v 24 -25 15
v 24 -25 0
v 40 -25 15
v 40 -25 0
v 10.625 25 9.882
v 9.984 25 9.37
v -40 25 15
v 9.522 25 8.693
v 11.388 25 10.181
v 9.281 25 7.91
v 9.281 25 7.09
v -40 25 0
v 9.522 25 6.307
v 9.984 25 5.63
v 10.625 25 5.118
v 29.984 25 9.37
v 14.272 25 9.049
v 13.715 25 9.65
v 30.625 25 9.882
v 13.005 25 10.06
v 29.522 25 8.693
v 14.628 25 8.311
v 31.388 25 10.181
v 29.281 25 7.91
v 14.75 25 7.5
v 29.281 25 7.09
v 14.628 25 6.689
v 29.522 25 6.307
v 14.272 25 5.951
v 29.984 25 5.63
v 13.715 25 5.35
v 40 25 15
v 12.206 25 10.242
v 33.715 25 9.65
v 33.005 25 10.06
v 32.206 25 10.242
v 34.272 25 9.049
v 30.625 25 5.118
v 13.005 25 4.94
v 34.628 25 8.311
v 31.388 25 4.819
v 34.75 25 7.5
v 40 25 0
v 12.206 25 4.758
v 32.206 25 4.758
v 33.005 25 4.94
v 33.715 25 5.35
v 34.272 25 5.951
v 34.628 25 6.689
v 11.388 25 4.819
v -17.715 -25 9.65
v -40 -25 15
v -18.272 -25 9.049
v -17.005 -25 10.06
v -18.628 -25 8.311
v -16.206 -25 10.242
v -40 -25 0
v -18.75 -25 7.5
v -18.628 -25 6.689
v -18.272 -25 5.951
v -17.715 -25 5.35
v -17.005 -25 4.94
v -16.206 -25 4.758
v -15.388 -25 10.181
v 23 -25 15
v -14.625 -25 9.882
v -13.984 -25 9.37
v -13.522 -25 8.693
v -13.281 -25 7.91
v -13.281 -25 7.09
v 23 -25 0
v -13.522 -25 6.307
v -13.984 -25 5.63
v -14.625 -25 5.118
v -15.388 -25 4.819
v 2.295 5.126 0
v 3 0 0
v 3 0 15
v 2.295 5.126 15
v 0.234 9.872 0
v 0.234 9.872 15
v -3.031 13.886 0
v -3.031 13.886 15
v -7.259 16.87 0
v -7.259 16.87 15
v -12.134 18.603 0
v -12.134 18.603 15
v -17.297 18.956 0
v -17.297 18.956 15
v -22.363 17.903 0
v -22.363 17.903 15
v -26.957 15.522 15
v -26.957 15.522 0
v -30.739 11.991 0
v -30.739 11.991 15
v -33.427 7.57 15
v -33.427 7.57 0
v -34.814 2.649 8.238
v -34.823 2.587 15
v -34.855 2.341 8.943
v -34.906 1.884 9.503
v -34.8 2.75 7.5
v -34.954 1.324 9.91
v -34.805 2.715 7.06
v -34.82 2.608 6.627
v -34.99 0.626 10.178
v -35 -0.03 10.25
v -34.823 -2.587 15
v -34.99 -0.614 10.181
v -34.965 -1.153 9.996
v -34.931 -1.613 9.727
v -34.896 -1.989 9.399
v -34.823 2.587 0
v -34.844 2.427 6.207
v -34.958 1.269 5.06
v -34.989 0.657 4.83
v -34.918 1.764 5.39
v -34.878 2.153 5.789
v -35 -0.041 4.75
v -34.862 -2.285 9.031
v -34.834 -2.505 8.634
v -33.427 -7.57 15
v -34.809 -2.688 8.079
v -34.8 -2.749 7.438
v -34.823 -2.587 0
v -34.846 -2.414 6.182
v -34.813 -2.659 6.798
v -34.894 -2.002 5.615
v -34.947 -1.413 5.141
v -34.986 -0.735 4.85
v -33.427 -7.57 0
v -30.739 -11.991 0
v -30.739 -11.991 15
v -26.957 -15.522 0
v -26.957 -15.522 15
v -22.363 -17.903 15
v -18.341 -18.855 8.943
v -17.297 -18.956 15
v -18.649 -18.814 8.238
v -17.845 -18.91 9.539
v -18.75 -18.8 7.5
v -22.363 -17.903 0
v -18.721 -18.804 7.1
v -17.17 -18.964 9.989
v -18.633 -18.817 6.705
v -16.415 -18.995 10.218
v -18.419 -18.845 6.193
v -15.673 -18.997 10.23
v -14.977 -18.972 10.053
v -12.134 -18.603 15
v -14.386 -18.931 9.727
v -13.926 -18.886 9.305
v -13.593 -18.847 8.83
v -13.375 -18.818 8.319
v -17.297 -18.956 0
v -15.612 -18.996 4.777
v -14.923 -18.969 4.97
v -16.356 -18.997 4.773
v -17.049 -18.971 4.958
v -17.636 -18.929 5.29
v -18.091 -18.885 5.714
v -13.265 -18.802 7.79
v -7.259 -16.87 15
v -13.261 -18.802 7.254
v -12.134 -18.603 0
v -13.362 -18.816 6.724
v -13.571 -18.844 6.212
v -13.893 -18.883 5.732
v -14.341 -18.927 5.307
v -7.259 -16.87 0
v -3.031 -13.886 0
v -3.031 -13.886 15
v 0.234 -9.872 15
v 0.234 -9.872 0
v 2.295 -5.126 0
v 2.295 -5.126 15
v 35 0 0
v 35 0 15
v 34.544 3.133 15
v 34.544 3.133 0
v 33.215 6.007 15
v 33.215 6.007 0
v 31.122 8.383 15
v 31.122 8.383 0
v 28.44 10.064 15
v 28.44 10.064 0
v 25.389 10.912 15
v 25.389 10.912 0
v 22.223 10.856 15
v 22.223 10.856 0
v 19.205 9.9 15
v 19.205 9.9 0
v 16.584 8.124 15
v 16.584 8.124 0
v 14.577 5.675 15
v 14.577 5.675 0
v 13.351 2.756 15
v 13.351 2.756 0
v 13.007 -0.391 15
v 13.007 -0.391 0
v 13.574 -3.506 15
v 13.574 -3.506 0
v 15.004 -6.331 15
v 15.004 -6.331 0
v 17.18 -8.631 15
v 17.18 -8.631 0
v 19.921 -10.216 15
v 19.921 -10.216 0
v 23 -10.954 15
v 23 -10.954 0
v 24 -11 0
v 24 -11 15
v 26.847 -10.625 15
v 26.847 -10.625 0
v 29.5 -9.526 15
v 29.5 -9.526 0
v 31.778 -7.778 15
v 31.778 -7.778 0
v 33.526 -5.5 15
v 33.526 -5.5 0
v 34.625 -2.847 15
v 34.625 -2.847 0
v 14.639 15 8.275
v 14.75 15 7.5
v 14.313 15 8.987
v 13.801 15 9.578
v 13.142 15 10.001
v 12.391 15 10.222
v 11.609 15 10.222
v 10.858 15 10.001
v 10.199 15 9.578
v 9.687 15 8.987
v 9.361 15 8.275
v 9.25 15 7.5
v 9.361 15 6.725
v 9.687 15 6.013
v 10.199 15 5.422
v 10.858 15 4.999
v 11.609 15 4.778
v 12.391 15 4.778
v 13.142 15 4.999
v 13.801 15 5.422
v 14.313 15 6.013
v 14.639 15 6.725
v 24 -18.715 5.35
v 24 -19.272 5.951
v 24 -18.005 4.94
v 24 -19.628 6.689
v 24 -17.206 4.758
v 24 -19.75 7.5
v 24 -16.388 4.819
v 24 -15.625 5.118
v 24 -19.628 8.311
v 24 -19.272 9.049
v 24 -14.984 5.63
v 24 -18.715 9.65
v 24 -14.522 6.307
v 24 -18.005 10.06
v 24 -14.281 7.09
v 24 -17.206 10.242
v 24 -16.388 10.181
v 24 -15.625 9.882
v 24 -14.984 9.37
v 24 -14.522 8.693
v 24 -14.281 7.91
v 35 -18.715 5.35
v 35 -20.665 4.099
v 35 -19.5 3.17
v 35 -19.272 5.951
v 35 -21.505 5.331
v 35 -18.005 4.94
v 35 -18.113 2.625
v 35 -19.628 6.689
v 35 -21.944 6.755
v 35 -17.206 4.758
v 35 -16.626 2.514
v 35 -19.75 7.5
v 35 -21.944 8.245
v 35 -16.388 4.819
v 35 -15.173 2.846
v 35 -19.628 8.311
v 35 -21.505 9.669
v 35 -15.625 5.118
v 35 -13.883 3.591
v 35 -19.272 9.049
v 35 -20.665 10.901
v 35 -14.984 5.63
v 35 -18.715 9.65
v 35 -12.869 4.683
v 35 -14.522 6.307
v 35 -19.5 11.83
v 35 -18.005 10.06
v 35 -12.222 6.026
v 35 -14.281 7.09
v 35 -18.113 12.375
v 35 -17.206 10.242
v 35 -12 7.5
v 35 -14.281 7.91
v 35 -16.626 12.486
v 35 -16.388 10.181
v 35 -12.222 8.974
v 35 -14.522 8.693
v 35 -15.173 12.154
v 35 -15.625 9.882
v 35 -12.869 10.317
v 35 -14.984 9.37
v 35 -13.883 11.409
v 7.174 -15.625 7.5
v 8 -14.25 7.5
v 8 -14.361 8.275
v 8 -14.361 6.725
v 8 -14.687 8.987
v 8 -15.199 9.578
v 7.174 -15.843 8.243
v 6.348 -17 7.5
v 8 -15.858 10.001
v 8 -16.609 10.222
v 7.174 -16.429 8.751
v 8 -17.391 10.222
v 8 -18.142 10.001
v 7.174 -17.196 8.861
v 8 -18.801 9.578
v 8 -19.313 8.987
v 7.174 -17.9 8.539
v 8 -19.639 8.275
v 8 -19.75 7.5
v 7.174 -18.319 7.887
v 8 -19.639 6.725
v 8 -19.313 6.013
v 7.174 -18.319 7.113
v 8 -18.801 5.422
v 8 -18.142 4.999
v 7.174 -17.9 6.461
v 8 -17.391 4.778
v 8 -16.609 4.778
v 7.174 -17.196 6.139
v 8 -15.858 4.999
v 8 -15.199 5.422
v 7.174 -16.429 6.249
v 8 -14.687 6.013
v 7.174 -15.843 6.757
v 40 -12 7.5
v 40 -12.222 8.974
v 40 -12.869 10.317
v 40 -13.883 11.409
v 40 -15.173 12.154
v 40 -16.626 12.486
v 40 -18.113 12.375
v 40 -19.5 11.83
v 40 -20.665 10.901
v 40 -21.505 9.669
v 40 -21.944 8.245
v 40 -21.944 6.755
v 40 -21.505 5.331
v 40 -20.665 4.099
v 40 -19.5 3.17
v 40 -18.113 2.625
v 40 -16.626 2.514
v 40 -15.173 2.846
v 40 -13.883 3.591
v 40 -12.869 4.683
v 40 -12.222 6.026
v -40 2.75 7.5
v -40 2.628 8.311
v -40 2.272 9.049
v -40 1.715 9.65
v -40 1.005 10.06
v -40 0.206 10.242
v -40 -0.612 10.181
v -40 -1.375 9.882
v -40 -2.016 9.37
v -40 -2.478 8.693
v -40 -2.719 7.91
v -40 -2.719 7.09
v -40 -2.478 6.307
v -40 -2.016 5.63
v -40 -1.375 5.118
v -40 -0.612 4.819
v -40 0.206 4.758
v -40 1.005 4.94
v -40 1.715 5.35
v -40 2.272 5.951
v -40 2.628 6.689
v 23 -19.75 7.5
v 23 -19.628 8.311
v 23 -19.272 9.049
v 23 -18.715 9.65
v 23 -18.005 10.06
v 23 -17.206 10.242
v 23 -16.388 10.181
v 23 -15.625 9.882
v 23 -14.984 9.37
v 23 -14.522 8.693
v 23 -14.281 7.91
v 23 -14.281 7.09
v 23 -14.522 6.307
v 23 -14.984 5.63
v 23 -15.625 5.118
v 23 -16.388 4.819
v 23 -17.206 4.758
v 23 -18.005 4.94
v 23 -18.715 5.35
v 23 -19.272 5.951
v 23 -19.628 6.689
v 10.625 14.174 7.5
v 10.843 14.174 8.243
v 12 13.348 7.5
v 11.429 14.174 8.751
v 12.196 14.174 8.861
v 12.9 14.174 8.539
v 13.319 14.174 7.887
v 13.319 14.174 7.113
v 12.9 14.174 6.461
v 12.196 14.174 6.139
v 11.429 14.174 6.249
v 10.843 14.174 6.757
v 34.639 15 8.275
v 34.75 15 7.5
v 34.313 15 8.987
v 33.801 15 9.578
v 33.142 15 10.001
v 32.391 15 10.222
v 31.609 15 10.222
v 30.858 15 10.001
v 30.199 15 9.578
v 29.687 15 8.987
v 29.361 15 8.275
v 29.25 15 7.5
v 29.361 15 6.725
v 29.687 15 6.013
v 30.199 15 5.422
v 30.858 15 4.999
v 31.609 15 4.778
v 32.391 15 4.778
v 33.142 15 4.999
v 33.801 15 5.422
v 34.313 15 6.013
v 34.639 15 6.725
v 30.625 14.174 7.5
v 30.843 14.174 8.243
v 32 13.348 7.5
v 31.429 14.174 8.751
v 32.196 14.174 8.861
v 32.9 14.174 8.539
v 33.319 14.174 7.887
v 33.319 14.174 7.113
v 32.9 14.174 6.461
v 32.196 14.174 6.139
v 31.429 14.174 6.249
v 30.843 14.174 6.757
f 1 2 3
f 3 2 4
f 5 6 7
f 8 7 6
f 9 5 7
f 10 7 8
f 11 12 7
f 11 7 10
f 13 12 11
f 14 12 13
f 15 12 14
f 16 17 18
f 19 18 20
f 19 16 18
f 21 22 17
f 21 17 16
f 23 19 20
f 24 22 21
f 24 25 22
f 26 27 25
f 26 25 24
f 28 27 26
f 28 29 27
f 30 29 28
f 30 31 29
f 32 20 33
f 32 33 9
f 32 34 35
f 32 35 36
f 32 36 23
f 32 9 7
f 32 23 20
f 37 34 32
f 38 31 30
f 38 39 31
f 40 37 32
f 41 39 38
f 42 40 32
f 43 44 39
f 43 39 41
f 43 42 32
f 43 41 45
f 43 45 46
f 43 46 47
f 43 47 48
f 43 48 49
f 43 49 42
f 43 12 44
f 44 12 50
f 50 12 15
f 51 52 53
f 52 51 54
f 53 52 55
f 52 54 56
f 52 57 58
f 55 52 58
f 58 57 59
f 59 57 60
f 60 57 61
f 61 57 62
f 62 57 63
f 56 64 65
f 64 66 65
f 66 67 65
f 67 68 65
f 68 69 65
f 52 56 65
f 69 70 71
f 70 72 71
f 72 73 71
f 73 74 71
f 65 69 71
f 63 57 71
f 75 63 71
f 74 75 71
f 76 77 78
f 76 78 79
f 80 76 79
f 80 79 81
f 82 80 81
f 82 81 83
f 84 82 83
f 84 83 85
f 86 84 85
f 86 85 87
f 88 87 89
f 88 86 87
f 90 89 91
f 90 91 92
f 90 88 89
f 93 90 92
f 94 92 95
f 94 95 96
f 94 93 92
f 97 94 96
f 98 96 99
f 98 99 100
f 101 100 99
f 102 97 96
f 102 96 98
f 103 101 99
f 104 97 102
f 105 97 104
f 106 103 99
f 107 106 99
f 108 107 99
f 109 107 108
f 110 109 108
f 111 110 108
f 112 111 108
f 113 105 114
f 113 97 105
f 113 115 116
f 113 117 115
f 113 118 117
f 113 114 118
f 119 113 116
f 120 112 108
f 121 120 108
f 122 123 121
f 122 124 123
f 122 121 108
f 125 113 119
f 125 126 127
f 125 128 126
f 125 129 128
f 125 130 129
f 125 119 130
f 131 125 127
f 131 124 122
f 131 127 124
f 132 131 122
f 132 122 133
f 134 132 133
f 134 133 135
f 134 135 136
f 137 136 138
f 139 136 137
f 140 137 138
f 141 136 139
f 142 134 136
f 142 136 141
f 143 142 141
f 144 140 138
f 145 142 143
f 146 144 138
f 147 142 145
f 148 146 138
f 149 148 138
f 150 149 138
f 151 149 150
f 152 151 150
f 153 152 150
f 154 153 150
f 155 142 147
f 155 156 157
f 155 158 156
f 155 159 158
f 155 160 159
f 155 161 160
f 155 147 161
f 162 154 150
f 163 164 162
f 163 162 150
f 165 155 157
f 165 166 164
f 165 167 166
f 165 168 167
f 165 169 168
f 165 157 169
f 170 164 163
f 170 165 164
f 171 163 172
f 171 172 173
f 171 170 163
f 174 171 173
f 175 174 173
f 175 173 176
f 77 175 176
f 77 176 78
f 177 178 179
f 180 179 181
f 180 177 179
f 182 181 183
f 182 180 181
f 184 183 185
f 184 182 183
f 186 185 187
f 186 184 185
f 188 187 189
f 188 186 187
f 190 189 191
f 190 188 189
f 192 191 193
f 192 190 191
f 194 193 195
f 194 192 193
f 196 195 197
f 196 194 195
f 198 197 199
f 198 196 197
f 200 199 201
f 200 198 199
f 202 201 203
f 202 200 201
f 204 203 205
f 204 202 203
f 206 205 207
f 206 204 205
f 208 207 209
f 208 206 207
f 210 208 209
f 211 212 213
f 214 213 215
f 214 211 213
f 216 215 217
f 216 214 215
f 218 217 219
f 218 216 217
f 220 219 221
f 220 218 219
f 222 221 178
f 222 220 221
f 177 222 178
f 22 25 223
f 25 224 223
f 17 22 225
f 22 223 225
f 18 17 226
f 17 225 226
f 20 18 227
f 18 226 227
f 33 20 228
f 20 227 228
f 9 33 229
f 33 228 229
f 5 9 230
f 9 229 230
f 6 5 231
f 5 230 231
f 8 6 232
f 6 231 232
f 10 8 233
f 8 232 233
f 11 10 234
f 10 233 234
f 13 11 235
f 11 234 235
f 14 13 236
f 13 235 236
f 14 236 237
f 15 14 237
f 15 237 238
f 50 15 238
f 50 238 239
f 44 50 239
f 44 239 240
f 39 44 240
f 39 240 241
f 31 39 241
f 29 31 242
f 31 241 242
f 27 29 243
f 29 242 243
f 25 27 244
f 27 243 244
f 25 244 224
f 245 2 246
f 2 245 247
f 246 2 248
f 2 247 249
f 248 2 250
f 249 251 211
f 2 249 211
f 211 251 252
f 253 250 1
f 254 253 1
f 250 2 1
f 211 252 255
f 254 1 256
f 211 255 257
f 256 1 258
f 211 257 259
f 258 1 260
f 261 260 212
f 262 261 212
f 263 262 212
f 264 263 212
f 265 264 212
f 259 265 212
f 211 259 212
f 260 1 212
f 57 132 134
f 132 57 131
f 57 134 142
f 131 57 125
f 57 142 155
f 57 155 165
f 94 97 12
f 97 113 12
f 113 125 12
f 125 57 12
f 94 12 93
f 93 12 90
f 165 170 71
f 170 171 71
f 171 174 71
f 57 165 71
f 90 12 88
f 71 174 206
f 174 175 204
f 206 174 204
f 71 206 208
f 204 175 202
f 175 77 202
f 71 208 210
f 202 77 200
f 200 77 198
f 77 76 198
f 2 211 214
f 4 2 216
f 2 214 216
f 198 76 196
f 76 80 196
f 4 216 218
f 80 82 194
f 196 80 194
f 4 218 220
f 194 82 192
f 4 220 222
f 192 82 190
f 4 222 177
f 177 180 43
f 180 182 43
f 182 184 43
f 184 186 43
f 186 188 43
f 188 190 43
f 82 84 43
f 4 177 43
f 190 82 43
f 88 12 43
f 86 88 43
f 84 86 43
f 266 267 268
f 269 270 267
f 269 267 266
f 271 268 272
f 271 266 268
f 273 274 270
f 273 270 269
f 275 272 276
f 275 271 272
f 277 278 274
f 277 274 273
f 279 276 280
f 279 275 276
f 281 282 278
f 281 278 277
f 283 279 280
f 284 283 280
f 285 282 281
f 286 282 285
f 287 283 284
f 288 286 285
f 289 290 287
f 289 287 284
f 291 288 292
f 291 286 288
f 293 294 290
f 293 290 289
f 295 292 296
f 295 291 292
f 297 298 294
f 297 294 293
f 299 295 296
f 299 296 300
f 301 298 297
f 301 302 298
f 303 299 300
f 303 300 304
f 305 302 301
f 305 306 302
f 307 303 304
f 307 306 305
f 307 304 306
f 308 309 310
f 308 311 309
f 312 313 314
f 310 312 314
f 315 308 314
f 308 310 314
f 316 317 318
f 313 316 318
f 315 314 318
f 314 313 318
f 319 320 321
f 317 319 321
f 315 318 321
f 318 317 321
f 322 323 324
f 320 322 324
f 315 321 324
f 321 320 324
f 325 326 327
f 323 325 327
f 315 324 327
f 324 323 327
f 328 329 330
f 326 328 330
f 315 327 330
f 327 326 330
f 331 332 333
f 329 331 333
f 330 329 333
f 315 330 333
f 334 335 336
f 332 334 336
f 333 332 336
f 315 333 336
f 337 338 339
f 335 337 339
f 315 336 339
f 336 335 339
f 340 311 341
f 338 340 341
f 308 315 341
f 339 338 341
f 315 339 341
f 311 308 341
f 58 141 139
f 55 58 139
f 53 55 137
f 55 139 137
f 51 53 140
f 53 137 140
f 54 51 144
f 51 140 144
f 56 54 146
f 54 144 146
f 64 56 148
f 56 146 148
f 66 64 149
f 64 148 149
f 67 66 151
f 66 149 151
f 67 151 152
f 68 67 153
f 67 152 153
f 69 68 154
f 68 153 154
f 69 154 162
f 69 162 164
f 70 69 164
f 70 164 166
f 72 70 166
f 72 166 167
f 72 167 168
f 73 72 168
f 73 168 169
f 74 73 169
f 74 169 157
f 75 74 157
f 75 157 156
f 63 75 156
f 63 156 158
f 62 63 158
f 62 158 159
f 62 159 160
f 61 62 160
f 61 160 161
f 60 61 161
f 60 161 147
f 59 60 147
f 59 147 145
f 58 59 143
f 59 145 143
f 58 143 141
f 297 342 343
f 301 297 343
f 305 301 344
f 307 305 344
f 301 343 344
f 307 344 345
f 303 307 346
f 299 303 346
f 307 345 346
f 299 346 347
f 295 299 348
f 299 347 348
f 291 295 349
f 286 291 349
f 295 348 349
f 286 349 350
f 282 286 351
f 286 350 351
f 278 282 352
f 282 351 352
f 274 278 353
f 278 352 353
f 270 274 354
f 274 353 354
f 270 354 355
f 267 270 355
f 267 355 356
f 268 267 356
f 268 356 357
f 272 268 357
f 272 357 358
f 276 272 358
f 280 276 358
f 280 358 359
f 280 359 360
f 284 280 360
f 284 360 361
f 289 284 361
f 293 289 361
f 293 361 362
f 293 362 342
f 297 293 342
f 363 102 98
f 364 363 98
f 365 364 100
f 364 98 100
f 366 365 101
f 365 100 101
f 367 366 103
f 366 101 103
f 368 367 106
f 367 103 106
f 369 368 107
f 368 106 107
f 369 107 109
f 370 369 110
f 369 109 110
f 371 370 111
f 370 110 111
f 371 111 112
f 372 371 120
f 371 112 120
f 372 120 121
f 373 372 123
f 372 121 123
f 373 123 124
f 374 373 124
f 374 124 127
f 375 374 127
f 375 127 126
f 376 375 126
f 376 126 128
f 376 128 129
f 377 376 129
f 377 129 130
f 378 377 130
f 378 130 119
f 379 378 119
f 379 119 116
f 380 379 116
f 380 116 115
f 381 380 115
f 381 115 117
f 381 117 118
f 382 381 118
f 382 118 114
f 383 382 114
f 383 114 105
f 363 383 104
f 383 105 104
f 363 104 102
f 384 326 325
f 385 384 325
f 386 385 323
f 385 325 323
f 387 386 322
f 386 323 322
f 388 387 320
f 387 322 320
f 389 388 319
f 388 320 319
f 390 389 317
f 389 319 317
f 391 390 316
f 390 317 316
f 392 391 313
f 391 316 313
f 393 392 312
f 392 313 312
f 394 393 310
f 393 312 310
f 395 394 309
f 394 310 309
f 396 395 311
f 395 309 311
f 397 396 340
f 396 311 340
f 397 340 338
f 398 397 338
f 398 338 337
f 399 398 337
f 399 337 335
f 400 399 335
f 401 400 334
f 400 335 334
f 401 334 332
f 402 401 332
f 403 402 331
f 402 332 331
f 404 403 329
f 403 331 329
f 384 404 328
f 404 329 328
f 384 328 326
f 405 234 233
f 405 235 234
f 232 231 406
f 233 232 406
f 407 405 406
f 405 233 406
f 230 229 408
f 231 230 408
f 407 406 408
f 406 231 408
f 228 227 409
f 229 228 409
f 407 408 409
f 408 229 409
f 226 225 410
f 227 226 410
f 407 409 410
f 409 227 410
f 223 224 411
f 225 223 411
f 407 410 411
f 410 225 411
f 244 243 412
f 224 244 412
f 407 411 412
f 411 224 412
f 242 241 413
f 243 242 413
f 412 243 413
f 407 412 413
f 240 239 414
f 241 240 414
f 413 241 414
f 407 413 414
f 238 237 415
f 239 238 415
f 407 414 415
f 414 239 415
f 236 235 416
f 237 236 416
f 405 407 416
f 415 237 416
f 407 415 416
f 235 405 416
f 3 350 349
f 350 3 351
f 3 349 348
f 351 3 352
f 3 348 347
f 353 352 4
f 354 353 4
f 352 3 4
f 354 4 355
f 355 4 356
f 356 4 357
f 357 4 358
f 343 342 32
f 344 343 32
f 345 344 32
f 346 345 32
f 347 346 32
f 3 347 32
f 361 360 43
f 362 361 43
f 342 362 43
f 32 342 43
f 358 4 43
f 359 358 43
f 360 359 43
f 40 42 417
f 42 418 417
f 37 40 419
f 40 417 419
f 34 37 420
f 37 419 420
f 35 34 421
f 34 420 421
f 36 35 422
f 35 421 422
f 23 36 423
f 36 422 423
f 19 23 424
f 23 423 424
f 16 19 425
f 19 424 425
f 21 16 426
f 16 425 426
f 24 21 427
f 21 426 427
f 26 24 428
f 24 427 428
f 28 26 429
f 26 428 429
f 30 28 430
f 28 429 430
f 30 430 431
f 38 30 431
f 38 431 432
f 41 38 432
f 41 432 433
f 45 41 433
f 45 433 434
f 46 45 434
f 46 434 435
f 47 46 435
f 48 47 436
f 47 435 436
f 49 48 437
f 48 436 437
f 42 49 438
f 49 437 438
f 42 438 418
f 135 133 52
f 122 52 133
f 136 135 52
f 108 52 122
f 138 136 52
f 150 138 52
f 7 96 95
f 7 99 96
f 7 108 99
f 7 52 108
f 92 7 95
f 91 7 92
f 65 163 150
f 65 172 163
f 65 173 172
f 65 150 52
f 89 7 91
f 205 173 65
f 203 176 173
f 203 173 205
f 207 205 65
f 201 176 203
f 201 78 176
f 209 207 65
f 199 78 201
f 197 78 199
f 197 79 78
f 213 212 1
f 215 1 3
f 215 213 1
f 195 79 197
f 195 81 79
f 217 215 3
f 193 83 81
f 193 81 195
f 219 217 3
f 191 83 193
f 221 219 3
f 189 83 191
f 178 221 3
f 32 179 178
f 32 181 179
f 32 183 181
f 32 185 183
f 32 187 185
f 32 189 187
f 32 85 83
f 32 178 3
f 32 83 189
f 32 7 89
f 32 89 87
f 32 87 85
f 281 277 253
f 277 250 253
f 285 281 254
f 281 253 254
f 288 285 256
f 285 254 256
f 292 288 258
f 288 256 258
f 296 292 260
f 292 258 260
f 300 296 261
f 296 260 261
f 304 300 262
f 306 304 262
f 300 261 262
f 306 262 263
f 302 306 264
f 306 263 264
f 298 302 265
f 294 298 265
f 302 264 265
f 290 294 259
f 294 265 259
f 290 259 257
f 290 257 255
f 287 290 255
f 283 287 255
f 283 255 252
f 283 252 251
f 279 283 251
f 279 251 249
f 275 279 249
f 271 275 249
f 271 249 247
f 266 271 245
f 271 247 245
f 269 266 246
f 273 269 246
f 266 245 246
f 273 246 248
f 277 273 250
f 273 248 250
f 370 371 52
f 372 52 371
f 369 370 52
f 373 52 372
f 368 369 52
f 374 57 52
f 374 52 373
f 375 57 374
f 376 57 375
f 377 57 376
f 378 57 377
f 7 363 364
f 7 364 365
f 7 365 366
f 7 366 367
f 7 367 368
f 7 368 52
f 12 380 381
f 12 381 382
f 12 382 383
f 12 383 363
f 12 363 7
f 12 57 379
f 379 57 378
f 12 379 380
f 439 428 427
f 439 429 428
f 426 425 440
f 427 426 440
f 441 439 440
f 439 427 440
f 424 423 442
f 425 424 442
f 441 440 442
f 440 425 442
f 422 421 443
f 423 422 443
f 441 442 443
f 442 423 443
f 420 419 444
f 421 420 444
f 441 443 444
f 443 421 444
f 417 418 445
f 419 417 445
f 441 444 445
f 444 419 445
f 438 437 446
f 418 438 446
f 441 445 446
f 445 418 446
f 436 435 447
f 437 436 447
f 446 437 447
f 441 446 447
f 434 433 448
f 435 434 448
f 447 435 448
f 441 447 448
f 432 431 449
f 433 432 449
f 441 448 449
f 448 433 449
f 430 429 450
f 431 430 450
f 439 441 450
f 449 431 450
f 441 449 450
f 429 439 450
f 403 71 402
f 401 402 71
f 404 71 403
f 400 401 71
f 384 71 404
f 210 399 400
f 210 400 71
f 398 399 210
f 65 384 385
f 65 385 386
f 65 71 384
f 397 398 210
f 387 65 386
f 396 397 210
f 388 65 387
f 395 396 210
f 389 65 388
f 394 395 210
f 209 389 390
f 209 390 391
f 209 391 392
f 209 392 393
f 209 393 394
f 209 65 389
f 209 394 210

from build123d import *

# Parameters (mm, degrees)
F0_W           = 80
F0_H           = 50
F0_R           = 19
F0_R_2         = 11
F1_DEPTH       = 15
F2_W           = 1
F2_H           = 15
F3_DEPTH       = 25
F5_D           = 5.5
F5_DEPTH       = 18
F5_CBORE_D     = 10
F5_CBORE_DEPTH = 5
F5_TIP         = 1.6523667023
F7_D           = 5.5
F7_DEPTH       = 15
F7_TIP         = 1.6523667023
F9_D           = 5.5
F9_DEPTH       = 15
F9_TIP         = 1.6523667023
F11_D          = 5.5
F11_DEPTH      = 15
F11_TIP        = 1.6523667023
F13_D          = 5.5
F13_DEPTH      = 10
F13_TIP        = 1.6523667023


with BuildPart() as f1:
    # F0 (on Top) → F1 (new body)
    with BuildSketch(Plane.XY):
        Rectangle(F0_W, F0_H)
        with Locations((-16, 0)):
            Circle(F0_R, mode=Mode.SUBTRACT)
        with Locations((24, 0)):
            Circle(F0_R_2, mode=Mode.SUBTRACT)
    extrude(amount=F1_DEPTH)

    # F2 (on face) → F3 (cut)
    with BuildSketch(Plane.XY.offset(15)):
        with Locations((23.5, -17.5)):
            Rectangle(F2_W, F2_H)
    extrude(amount=-F3_DEPTH, mode=Mode.SUBTRACT)

    # F5
    with Locations(Plane.YZ.offset(40)):
        with Locations((-17, 7.5)):
            CounterBoreHole(F5_D / 2, F5_CBORE_D / 2, F5_CBORE_DEPTH, depth=F5_DEPTH)
            with Locations((0, 0, -(F5_DEPTH + F5_TIP / 2))):  # 118° drill point
                Cone(0, F5_D / 2, F5_TIP, mode=Mode.SUBTRACT)

    # F7
    with Locations(Plane.YZ.offset(23)):
        with Locations((-17, 7.5)):
            Hole(F7_D / 2, depth=F7_DEPTH)
            with Locations((0, 0, -(F7_DEPTH + F7_TIP / 2))):  # 118° drill point
                Cone(0, F7_D / 2, F7_TIP, mode=Mode.SUBTRACT)

    # F9
    with Locations(Plane.XZ.offset(25)):
        with Locations((-16, 7.5)):
            Hole(F9_D / 2, depth=F9_DEPTH)
            with Locations((0, 0, -(F9_DEPTH + F9_TIP / 2))):  # 118° drill point
                Cone(0, F9_D / 2, F9_TIP, mode=Mode.SUBTRACT)

    # F11
    with Locations(Plane(origin=(-40, 0, 0), x_dir=(0, -1, 0), z_dir=(-1, 0, 0))):
        with Locations((0, 7.5)):
            Hole(F11_D / 2, depth=F11_DEPTH)
            with Locations((0, 0, -(F11_DEPTH + F11_TIP / 2))):  # 118° drill point
                Cone(0, F11_D / 2, F11_TIP, mode=Mode.SUBTRACT)

    # F13
    with Locations(Plane(origin=(0, 25, 0), x_dir=(-1, 0, 0), z_dir=(0, 1, 0))):
        with Locations((-32, 7.5), (-12, 7.5)):
            Hole(F13_D / 2, depth=F13_DEPTH)
            with Locations((0, 0, -(F13_DEPTH + F13_TIP / 2))):  # 118° drill point
                Cone(0, F13_D / 2, F13_TIP, mode=Mode.SUBTRACT)


solid = f1.part
